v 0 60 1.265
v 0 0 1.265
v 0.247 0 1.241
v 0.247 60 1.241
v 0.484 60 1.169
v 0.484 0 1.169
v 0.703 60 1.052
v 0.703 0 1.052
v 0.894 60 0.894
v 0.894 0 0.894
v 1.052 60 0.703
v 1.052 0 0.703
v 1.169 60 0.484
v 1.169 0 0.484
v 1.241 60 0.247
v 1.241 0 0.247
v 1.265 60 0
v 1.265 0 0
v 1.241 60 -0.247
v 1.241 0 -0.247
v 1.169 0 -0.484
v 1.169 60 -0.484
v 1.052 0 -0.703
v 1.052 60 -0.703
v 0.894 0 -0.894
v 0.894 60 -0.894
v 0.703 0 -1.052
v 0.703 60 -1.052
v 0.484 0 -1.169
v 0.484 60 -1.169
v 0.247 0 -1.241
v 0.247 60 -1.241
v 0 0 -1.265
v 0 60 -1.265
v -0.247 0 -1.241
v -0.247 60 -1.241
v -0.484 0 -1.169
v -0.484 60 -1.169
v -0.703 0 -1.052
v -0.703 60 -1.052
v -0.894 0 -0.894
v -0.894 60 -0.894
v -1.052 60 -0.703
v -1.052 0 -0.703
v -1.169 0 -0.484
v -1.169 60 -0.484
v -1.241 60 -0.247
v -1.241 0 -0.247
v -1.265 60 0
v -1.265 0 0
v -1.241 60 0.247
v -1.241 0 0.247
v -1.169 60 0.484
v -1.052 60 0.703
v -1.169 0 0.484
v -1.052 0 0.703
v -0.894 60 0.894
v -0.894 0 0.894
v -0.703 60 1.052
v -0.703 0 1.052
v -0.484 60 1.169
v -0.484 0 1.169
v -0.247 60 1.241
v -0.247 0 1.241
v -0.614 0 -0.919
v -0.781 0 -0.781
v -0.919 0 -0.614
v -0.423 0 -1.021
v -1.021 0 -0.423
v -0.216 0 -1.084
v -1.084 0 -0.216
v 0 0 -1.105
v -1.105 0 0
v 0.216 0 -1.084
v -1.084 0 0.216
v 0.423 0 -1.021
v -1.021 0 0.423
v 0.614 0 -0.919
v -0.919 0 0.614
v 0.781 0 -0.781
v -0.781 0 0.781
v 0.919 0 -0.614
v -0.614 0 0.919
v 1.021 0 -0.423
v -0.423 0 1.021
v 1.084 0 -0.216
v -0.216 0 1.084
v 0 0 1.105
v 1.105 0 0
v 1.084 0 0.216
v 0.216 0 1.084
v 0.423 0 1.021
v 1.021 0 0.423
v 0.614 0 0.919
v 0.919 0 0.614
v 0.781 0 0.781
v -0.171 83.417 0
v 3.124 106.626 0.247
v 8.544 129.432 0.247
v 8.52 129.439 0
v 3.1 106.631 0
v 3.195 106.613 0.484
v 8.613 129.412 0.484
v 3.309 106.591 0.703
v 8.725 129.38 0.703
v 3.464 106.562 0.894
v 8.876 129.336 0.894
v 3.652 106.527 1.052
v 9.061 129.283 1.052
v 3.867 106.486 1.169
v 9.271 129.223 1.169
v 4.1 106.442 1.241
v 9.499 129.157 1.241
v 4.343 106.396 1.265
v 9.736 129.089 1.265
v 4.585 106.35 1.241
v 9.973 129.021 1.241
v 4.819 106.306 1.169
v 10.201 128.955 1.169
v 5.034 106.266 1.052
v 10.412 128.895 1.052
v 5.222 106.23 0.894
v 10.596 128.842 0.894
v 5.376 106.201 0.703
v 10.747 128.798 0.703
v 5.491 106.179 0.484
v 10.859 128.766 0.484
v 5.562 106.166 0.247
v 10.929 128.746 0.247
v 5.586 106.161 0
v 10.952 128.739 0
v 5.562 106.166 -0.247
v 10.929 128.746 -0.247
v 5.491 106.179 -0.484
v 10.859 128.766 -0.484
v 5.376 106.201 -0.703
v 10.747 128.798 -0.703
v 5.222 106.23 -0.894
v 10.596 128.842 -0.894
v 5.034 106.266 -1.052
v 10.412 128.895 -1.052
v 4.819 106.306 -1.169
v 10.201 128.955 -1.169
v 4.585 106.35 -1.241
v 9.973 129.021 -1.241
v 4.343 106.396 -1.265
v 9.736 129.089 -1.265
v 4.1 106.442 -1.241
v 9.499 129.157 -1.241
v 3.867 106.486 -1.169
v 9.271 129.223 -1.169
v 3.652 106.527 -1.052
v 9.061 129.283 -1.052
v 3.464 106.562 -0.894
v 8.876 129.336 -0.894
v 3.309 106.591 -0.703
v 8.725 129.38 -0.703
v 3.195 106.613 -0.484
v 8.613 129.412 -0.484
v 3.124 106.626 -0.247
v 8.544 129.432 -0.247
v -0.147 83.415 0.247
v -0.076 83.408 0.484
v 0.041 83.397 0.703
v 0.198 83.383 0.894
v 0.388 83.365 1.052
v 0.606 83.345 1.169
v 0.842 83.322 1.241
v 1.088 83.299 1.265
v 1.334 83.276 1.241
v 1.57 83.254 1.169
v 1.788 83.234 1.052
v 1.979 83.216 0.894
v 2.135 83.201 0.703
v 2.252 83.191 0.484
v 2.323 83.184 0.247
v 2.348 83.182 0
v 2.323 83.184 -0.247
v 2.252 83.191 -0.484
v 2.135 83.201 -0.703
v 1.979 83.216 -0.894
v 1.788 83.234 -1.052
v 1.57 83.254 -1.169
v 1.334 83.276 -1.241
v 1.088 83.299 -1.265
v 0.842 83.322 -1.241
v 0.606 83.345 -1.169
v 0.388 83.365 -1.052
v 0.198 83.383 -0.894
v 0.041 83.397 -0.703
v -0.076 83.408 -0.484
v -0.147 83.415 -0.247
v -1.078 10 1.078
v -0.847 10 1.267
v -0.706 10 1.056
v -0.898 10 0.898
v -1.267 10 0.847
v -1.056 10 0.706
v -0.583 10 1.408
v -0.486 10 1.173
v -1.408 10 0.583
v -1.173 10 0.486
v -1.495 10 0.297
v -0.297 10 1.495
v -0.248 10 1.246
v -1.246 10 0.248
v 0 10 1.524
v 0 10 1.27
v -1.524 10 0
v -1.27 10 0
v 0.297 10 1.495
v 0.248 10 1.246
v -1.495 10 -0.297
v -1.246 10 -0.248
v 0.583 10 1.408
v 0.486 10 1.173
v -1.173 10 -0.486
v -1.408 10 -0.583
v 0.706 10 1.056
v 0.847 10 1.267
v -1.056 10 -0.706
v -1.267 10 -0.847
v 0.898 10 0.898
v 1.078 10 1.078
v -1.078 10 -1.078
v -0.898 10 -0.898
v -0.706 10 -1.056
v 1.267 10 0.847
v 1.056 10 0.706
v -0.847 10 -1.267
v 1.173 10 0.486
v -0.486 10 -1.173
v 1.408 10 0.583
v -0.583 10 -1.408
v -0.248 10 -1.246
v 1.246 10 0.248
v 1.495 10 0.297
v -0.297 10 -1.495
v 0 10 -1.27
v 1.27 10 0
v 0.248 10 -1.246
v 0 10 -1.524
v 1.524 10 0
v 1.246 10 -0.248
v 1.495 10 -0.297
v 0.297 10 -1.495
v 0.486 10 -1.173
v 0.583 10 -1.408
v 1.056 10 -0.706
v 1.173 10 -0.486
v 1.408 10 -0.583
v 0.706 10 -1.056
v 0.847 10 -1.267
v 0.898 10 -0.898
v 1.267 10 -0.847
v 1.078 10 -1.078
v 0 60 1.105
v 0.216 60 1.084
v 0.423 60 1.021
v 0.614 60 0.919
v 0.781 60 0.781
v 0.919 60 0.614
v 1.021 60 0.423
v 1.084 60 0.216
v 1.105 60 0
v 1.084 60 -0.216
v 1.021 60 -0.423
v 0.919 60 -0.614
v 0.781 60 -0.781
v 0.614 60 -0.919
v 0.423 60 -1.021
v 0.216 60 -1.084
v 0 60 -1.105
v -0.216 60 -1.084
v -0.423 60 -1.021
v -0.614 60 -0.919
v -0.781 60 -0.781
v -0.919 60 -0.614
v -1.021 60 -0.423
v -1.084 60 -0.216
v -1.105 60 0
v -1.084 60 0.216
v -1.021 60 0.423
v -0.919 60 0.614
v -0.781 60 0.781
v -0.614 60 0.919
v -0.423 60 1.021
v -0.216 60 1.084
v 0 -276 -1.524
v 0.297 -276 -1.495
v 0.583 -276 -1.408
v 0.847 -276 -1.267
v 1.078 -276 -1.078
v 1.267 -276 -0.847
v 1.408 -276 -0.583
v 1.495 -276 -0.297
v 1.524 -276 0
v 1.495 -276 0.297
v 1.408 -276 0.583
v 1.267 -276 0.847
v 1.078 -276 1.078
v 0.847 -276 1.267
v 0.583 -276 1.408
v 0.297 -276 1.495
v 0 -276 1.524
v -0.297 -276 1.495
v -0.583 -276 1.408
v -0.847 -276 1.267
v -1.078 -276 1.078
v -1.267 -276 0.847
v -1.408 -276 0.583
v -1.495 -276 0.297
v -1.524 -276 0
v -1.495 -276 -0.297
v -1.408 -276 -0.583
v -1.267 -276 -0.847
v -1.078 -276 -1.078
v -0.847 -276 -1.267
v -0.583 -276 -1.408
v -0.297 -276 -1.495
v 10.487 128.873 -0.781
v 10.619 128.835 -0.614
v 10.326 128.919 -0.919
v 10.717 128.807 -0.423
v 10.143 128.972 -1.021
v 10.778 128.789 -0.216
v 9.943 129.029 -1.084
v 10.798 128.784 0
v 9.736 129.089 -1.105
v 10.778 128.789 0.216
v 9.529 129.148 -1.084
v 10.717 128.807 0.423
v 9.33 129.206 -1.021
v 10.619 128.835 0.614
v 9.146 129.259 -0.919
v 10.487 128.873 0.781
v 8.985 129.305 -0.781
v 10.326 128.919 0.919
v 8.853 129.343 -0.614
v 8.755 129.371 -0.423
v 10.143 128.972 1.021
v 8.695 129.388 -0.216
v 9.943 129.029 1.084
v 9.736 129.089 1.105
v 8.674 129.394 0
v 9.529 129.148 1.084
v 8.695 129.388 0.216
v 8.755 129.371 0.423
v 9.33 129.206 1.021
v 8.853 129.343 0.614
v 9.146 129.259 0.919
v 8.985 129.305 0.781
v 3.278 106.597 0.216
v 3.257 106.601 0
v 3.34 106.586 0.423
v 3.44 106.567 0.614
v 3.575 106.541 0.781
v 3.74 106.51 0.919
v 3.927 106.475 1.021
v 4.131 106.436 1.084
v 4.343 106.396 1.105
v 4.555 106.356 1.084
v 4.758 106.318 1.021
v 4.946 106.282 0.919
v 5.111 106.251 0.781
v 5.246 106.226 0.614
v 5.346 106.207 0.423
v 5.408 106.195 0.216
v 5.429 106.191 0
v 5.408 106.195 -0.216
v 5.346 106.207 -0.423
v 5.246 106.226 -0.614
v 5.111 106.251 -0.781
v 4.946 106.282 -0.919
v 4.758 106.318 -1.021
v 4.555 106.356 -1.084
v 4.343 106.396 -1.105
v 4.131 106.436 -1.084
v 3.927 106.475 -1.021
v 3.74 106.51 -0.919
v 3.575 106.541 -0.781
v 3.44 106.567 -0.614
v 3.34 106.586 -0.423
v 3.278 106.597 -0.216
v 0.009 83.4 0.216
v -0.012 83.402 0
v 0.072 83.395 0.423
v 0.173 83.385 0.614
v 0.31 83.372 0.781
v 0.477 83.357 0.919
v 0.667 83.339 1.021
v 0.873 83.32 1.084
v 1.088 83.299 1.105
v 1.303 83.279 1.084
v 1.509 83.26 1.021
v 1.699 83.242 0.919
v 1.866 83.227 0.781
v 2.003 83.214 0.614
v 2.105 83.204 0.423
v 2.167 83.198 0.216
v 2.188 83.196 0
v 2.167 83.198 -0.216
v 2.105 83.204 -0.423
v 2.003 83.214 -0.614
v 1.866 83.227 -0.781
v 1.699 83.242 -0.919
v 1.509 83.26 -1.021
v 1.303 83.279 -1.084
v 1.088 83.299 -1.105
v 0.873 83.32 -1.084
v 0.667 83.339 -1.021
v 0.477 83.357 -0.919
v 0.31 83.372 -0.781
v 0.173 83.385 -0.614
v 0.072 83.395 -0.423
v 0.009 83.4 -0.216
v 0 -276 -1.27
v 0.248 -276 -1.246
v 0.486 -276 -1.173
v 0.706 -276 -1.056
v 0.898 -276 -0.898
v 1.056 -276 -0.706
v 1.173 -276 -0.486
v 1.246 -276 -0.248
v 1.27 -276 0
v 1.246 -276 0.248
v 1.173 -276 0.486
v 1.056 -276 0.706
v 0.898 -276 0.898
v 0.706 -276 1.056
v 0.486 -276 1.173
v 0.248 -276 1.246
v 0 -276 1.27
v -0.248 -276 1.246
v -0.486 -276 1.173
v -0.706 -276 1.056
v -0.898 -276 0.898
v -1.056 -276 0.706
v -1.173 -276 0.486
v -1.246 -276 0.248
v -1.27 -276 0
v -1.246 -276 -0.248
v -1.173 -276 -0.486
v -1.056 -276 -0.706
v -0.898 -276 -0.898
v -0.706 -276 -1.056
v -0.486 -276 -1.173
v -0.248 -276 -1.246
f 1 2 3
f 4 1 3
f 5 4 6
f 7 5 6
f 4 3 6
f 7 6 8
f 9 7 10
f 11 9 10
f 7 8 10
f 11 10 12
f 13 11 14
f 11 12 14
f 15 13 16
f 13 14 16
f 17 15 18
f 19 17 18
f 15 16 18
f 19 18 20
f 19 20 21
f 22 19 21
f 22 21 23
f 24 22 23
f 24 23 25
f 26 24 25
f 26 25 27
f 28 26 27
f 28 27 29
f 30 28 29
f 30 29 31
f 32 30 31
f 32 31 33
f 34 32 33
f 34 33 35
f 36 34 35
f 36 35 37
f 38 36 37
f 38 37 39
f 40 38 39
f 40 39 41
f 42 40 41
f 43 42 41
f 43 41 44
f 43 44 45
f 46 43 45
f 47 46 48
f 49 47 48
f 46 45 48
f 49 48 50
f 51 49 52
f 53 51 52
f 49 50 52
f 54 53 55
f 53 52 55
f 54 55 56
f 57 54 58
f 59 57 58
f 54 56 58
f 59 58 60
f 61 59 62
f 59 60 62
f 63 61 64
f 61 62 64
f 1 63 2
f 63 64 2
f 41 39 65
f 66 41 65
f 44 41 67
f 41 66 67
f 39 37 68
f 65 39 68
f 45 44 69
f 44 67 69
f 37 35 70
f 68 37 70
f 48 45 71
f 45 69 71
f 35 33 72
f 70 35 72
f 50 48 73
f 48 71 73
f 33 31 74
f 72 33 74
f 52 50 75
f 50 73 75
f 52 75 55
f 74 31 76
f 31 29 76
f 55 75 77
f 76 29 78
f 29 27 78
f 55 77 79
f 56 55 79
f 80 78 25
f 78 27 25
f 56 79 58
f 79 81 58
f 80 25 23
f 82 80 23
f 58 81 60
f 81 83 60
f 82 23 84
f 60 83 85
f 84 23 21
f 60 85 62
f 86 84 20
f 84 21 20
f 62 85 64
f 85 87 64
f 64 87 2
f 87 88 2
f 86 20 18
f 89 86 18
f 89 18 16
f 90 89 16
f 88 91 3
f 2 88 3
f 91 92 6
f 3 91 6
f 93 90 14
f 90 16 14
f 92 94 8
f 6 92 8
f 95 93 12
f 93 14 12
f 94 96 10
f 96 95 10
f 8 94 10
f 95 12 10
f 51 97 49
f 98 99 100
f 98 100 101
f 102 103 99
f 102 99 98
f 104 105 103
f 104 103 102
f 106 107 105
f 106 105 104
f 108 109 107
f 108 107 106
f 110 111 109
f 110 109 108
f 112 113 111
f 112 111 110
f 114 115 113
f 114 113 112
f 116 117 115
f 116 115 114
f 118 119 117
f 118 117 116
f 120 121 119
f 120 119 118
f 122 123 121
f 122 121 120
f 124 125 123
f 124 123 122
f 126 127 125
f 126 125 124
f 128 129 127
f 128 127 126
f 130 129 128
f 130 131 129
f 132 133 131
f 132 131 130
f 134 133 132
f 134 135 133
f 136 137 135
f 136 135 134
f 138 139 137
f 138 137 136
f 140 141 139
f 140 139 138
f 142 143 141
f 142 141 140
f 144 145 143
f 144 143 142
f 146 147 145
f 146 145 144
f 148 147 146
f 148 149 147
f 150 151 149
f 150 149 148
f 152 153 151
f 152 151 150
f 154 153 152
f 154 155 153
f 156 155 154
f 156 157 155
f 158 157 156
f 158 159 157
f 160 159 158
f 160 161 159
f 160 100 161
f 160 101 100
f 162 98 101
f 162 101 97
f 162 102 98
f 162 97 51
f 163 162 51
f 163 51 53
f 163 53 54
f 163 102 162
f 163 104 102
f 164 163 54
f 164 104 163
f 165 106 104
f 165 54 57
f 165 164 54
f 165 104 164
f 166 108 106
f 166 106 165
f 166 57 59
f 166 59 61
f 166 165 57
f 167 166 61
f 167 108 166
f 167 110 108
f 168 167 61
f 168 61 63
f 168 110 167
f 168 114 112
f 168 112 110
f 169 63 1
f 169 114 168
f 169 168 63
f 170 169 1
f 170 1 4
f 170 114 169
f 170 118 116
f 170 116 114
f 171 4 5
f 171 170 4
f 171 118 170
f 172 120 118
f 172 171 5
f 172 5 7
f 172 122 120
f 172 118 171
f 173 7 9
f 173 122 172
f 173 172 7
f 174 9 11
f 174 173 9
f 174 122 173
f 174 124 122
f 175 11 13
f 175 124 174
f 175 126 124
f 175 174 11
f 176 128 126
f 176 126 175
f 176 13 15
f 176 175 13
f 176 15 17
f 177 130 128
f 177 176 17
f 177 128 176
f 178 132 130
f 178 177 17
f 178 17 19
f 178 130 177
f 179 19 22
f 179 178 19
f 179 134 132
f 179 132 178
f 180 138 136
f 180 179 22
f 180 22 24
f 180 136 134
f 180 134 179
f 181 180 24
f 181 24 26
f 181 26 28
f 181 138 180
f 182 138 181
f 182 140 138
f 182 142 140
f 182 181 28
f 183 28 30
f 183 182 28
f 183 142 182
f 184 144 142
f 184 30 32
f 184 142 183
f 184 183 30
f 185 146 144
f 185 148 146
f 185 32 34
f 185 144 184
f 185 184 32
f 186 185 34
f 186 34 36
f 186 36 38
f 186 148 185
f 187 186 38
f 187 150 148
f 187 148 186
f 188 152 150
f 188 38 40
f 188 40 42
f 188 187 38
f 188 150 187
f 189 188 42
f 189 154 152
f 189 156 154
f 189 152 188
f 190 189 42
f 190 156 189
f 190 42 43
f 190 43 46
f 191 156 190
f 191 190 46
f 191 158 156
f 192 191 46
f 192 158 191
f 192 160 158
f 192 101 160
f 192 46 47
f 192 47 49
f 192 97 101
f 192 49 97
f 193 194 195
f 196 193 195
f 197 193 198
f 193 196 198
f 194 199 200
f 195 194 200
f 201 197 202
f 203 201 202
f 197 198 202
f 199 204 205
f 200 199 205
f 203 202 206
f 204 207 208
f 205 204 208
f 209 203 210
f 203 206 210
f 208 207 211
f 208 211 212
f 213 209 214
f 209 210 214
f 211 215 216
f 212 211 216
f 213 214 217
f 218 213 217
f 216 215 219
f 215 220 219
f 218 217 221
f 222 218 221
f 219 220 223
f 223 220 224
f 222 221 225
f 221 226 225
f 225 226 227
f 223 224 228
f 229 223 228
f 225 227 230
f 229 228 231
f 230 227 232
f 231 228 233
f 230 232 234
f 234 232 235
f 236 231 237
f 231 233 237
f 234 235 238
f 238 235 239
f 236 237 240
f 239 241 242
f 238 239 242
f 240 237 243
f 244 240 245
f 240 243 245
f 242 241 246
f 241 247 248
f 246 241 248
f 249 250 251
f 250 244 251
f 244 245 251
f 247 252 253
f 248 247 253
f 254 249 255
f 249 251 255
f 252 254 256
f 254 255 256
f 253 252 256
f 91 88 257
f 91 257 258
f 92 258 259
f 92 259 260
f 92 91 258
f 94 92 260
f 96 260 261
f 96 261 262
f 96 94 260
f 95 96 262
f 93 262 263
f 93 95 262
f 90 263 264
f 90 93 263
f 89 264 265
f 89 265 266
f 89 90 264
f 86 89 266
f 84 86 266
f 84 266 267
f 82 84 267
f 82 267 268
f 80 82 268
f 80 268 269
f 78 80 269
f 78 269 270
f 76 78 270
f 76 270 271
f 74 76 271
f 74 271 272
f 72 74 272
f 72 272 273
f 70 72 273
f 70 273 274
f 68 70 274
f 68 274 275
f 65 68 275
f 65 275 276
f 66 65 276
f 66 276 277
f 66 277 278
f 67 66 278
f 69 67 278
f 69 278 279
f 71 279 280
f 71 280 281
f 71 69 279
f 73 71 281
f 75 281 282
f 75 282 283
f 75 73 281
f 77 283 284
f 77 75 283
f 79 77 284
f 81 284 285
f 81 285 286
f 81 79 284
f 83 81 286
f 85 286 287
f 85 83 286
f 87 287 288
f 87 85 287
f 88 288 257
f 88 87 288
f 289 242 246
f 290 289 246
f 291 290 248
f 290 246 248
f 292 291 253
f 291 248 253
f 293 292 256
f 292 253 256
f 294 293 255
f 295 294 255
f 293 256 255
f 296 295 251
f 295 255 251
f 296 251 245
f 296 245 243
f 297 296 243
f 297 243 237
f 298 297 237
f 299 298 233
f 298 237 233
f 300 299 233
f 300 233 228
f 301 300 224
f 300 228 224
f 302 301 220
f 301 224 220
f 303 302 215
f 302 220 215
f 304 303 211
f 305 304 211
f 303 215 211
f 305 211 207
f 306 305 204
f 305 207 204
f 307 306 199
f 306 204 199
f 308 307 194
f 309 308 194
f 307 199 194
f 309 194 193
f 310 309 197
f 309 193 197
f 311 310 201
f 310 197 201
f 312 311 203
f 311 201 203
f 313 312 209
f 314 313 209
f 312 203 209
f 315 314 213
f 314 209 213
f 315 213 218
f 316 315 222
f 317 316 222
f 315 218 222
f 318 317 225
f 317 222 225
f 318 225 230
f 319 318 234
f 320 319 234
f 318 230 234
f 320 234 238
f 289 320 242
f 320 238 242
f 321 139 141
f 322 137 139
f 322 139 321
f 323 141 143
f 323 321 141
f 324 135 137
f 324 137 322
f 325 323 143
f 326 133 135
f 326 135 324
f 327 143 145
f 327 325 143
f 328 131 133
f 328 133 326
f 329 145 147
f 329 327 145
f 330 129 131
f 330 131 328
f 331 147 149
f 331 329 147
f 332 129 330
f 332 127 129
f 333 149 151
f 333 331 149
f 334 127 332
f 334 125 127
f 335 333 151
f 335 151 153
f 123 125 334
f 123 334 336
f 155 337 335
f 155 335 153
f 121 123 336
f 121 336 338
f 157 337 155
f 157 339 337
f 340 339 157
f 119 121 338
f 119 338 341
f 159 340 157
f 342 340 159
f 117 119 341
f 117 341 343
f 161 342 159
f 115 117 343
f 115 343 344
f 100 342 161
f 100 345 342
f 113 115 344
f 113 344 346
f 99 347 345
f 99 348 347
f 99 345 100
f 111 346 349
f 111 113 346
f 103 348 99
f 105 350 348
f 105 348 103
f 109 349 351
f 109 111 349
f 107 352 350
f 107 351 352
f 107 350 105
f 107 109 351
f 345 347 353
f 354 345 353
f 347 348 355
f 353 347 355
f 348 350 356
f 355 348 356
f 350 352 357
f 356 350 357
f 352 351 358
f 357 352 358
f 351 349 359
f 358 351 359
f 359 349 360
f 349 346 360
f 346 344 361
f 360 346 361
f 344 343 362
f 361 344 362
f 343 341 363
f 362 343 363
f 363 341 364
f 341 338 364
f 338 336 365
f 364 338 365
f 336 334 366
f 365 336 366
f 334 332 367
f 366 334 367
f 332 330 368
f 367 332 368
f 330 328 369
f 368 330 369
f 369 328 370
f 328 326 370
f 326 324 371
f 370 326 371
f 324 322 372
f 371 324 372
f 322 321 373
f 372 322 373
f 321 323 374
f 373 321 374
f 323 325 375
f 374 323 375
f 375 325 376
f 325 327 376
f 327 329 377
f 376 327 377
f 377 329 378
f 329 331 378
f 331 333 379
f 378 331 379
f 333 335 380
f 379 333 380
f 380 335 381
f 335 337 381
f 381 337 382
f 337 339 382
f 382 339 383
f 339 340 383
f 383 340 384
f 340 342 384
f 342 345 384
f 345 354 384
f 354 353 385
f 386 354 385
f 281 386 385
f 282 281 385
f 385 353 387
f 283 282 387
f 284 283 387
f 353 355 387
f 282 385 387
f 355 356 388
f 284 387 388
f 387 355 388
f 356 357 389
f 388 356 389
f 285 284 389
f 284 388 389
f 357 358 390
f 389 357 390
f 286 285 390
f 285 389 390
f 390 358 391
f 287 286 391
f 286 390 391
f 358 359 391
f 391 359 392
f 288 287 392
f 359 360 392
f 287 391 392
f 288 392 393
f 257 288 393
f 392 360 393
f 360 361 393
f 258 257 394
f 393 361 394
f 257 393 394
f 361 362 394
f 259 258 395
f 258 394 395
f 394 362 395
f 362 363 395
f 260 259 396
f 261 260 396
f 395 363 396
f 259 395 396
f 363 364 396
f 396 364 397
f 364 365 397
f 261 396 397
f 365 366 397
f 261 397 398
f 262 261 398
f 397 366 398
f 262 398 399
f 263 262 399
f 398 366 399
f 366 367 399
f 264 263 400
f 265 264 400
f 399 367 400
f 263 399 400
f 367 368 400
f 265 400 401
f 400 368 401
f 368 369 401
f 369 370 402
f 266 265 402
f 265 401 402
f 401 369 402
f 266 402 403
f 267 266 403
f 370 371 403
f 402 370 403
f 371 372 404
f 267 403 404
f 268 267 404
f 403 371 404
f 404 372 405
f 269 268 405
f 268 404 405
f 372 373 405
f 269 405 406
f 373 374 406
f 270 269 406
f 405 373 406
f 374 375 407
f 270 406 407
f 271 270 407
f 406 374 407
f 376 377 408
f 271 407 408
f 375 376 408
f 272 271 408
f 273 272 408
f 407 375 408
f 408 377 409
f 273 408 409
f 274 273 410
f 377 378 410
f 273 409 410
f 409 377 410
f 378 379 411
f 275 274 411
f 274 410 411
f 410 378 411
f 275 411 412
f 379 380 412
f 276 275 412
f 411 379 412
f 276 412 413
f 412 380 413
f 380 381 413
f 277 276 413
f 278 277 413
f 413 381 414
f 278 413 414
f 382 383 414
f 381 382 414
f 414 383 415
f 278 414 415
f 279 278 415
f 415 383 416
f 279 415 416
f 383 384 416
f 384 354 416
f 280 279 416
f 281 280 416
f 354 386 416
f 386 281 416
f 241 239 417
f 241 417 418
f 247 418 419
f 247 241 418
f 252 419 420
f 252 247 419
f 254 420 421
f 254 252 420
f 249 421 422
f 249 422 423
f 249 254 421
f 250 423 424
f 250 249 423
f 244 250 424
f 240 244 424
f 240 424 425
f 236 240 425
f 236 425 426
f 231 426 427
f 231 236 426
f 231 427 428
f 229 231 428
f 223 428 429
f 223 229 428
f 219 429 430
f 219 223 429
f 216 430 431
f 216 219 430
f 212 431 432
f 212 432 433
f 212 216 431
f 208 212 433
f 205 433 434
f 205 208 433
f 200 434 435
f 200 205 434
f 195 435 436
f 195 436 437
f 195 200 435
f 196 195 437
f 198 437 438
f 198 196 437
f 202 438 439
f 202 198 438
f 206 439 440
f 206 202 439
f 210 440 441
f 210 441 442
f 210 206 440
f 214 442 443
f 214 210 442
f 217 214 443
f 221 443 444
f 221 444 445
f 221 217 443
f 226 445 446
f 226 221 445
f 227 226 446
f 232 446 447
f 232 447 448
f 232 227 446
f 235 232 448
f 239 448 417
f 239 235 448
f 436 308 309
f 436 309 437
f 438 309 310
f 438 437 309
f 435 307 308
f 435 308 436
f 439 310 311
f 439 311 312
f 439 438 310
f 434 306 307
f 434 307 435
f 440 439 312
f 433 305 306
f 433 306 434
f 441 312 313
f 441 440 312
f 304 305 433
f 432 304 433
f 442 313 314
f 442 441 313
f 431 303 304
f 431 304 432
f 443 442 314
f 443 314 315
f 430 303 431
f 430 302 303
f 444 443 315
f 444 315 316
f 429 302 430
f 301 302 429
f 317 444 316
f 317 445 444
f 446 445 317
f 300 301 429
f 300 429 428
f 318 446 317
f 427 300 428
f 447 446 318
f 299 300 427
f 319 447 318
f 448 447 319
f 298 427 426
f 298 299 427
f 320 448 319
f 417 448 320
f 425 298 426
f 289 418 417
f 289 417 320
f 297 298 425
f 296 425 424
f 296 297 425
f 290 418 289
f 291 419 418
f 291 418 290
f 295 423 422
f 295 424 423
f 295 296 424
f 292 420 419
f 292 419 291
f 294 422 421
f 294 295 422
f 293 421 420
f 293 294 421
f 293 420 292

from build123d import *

# Parameters (mm, degrees)
SKETCH1_R           = 1.265
SKETCH1_R_2         = 1.105
BOSS_EXTRUDE1_DEPTH = 60
SWEEP2_OUTLINE_R    = 1.265
SWEEP2_OUTLINE_R_2  = 1.105
SWEEP2_ANGLE        = 16.042818
SKETCH4_R           = 1.524
SKETCH4_R_2         = 1.27
BOSS_EXTRUDE2_DEPTH = 286


# Read off the part's stored shape, not the designer's step: Sweep2
with BuildPart() as part:
    # Sketch1 → Boss-Extrude1 (new body)
    with BuildSketch(Plane(origin=(0, 0, 0), x_dir=(1, 0, 0), z_dir=(0, 1, 0))):
        with Locations(Location((0, 0, 0), (0, 0, 270))):
            Circle(SKETCH1_R)
        with Locations(Location((0, 0, 0), (0, 0, 270))):
            Circle(SKETCH1_R_2, mode=Mode.SUBTRACT)
    extrude(amount=BOSS_EXTRUDE1_DEPTH)


with BuildPart() as sweep2_tool:
    # Sweep2 outline → Sweep2 (revolve)
    with BuildSketch(Plane(origin=(250, 60, 0), x_dir=(-0.9610554383107709, 0.2763556485641141, 0), z_dir=(0.2763556485641141, 0.9610554383107709, 0))):
        with Locations((250, 0)):
            Circle(SWEEP2_OUTLINE_R)
        with Locations((250, 0)):
            Circle(SWEEP2_OUTLINE_R_2, mode=Mode.SUBTRACT)
    revolve(axis=Axis((250, 60, 0), (0, 0, 1)), revolution_arc=SWEEP2_ANGLE)


with BuildPart() as part_1:
    add(part.part)


with BuildPart() as part_2:
    # Sweep2: joined with sweep2_tool
    add(part_1.part.fuse(sweep2_tool.part, tol=0.00001))


with BuildPart() as body_2:
    # Sketch4 → Boss-Extrude2 (new body)
    with BuildSketch(Plane(origin=(0, 10, 0), x_dir=(-1, 0, 0), z_dir=(0, -1, 0))):
        with Locations(Location((0, 0, 0), (0, 0, 90))):
            Circle(SKETCH4_R)
        with Locations(Location((0, 0, 0), (0, 0, 90))):
            Circle(SKETCH4_R_2, mode=Mode.SUBTRACT)
    extrude(amount=BOSS_EXTRUDE2_DEPTH)


solid = Compound([part_2.part, body_2.part])
